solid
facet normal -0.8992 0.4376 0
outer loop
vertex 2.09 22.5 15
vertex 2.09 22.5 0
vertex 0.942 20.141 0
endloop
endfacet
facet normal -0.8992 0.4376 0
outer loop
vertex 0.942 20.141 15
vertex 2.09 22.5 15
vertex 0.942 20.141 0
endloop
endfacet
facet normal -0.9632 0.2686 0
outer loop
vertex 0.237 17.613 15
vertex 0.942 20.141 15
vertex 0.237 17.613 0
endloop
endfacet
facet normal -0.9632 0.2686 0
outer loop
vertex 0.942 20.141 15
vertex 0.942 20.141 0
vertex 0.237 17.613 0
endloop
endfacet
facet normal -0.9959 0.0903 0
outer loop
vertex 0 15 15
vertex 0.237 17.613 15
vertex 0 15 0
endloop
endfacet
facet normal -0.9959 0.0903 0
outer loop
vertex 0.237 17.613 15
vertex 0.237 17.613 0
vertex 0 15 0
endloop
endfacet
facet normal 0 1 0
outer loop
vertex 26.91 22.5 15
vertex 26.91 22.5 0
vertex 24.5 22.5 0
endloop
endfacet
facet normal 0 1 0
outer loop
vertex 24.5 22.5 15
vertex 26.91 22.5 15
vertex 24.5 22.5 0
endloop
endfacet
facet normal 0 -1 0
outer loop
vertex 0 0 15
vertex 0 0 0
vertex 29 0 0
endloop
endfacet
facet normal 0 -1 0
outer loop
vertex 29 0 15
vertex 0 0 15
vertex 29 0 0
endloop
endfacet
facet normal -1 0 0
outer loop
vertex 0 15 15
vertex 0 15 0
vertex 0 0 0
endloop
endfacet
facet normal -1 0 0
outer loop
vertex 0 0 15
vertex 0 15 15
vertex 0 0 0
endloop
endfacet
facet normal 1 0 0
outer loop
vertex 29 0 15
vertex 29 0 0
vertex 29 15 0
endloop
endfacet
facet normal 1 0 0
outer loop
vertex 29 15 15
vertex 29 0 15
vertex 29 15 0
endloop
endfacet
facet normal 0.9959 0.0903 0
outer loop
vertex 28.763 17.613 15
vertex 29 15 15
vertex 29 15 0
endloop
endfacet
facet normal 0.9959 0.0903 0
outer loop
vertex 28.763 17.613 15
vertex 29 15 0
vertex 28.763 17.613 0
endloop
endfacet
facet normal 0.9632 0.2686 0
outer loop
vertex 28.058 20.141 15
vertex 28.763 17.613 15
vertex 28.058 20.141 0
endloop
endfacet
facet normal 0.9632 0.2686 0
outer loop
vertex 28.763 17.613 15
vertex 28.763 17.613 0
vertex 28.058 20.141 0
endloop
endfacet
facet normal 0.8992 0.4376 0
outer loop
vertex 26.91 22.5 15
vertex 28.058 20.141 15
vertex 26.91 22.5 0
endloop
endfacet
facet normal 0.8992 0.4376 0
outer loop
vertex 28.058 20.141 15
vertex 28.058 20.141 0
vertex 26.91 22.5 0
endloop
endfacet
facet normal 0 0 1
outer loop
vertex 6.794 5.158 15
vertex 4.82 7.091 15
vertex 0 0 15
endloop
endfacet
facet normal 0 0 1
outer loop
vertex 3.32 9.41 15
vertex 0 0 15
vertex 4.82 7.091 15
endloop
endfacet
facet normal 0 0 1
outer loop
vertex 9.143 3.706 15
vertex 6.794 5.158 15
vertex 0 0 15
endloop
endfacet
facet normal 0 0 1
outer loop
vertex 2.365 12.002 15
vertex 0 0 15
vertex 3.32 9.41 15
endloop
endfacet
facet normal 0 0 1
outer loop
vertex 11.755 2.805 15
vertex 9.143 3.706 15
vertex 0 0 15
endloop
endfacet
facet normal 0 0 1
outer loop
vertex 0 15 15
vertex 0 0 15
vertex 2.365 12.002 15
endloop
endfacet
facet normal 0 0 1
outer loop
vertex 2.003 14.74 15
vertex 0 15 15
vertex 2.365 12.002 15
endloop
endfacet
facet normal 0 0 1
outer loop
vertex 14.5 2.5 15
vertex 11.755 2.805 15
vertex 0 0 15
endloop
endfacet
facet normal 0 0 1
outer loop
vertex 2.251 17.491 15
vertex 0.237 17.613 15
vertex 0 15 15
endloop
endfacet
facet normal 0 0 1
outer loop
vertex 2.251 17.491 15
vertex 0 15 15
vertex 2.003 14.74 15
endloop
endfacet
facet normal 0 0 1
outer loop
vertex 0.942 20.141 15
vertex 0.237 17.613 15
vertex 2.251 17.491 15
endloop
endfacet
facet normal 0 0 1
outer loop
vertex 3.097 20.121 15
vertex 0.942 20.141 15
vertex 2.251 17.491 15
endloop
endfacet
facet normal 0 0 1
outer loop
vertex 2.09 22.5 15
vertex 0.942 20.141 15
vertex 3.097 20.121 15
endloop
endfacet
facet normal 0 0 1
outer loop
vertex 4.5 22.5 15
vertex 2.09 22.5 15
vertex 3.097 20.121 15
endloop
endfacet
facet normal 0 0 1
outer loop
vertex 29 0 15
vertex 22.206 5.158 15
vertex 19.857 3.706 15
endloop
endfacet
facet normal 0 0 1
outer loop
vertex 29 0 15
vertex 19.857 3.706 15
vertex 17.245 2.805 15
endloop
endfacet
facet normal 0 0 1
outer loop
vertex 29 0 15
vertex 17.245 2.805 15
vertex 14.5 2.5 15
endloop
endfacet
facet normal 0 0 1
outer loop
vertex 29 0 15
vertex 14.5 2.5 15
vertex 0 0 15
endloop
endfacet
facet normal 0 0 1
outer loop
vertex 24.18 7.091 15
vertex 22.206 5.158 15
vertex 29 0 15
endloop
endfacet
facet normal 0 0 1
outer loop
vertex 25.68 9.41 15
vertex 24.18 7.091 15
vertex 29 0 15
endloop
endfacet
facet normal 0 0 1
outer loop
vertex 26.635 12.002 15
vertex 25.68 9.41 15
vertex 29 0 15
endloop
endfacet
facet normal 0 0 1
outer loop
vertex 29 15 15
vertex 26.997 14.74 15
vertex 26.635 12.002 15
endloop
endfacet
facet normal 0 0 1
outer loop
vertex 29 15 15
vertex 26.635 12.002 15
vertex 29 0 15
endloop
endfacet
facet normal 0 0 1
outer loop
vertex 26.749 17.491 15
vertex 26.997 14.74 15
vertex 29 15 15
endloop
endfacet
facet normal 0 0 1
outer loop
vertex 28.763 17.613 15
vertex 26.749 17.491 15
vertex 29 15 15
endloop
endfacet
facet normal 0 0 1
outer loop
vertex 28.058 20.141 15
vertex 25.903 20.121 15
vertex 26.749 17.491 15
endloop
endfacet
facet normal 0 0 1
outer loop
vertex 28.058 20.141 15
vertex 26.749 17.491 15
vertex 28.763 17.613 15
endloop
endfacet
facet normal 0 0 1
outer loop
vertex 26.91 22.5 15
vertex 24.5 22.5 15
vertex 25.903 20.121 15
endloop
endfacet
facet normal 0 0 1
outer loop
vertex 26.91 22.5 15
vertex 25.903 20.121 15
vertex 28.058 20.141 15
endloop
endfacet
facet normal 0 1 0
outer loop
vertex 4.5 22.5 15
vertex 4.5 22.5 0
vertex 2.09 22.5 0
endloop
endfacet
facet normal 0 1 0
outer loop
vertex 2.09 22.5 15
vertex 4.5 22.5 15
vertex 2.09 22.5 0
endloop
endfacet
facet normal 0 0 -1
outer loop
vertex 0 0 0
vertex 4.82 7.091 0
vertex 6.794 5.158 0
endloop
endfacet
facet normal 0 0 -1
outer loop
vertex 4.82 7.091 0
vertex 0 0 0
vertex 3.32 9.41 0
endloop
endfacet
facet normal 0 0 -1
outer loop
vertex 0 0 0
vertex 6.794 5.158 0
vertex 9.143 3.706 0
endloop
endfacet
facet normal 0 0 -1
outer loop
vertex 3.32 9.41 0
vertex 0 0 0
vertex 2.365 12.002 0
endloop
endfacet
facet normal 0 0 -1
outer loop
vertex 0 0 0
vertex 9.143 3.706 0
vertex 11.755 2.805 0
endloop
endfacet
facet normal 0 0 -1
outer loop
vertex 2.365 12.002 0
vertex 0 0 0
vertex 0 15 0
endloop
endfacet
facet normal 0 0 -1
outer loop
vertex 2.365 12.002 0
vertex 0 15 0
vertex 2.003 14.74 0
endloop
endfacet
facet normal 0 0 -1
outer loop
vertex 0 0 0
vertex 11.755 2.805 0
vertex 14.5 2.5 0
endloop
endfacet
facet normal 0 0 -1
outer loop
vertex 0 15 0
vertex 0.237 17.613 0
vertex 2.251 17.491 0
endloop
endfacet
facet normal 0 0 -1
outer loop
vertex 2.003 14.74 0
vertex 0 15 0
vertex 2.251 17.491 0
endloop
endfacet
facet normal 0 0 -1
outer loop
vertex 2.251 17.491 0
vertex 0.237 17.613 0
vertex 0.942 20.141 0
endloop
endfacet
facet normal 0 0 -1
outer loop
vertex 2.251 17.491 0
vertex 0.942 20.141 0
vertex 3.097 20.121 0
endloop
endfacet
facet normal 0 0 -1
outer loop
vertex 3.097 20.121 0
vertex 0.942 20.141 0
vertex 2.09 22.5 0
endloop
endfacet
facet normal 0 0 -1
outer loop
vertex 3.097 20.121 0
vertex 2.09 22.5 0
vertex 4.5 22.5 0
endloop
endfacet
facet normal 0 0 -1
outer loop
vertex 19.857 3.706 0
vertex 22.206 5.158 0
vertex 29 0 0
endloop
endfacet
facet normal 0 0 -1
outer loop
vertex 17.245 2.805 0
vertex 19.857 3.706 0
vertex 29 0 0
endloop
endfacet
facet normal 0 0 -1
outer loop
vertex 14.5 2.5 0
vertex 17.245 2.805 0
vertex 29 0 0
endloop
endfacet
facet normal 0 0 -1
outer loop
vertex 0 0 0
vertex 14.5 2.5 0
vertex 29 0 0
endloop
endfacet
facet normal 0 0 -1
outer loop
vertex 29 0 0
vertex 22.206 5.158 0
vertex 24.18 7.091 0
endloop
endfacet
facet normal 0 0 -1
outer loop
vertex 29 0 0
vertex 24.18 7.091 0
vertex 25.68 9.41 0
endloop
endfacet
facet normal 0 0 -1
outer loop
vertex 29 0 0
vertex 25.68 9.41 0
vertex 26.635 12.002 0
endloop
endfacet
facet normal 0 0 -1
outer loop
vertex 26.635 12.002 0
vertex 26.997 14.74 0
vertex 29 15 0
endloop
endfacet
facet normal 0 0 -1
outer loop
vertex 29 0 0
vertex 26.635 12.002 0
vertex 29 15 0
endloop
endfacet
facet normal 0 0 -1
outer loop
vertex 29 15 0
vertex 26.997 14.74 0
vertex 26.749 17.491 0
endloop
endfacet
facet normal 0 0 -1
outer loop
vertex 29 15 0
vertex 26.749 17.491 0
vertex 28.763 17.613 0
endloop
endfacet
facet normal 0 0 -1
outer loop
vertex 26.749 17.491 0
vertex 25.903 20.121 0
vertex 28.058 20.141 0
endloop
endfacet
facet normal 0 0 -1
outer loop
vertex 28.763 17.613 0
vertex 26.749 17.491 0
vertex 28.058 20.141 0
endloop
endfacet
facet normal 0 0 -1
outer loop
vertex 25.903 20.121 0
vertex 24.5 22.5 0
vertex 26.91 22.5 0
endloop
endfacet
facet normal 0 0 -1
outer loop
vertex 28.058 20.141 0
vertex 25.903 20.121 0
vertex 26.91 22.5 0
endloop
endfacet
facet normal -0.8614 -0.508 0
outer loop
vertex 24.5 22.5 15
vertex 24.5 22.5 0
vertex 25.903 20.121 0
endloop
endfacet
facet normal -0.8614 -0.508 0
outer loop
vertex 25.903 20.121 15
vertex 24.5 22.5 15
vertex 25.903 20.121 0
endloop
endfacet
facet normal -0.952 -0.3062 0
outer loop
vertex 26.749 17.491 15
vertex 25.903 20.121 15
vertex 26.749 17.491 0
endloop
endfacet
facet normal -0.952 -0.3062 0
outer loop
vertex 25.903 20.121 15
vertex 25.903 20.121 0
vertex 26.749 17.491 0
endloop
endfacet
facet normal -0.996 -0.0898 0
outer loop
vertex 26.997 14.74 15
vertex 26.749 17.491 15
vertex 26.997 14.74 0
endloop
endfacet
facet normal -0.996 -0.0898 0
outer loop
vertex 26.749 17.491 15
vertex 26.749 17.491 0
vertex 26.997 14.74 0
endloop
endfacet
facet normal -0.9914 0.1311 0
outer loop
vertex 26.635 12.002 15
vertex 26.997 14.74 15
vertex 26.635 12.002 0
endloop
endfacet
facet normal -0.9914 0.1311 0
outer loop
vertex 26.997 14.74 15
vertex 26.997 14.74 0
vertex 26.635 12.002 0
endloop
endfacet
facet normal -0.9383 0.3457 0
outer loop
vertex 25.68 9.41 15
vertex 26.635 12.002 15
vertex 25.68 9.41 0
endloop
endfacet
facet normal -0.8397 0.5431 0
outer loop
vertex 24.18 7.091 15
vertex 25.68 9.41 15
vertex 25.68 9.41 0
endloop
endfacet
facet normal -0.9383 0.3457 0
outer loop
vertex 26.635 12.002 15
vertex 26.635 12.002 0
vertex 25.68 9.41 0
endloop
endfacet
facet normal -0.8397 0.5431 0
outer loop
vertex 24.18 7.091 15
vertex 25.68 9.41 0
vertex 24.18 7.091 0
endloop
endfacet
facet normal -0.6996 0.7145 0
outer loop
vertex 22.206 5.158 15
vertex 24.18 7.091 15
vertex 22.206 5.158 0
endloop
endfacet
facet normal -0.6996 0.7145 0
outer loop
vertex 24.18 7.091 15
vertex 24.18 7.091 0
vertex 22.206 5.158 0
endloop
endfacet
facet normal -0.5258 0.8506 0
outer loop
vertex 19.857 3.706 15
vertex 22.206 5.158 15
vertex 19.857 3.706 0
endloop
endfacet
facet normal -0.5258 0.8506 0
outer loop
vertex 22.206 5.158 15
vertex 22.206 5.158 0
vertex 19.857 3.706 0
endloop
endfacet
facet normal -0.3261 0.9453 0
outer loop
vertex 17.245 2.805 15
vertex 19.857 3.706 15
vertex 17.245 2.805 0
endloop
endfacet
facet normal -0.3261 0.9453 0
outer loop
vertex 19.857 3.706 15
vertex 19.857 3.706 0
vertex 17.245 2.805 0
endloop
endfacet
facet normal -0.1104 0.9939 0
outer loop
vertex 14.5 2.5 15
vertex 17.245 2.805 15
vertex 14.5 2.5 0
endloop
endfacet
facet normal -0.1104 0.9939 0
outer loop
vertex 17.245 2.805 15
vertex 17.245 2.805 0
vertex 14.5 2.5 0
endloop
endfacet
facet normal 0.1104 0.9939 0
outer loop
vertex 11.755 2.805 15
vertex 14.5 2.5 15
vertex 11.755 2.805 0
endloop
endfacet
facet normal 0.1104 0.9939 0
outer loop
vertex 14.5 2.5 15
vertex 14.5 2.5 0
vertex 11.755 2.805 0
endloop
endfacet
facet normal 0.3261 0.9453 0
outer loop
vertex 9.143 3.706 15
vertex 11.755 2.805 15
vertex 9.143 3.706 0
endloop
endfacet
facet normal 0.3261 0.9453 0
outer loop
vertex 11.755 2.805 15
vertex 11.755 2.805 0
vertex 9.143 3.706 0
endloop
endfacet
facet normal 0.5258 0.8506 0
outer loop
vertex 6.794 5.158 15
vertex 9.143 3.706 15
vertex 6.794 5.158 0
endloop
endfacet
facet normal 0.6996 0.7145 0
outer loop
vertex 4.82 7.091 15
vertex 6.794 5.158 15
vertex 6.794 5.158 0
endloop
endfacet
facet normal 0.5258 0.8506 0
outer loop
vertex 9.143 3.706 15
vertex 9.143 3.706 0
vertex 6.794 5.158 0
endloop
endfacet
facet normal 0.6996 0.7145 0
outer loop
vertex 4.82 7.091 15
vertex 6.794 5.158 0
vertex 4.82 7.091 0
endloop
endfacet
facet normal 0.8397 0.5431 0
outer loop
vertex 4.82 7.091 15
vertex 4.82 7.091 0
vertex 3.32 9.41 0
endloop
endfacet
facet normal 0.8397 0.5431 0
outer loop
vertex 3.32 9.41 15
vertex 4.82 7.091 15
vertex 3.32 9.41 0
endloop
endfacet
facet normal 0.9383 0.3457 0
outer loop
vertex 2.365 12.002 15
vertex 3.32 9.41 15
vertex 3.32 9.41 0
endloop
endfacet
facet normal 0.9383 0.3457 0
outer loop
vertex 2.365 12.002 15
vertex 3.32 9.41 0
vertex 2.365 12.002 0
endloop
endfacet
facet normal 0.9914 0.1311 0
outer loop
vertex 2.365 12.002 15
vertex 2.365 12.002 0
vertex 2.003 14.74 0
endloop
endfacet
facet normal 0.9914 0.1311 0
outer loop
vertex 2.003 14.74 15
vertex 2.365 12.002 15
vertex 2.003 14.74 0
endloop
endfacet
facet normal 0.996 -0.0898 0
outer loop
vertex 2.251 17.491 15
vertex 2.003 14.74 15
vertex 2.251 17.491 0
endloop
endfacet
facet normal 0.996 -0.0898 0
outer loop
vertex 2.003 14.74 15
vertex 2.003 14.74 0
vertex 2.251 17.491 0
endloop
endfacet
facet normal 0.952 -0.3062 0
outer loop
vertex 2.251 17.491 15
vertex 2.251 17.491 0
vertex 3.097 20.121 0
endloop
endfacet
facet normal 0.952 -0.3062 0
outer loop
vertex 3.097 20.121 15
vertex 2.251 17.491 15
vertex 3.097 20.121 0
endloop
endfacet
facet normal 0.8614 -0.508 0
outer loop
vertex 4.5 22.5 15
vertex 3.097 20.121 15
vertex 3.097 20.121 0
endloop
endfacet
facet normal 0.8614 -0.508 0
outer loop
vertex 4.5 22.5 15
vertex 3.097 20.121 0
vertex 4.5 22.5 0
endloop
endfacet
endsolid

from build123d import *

# Parameters (mm, degrees)
F1_DEPTH = 15


with BuildPart() as f1:
    # F0 (on Top) → F1 (new body)
    with BuildSketch(Plane.XY):
        with BuildLine():
            ThreePointArc((24.5, 22.5), (14.5, 2.5), (4.5, 22.5))
            Line((4.5, 22.5), (2.090326, 22.5))
            ThreePointArc((2.090326, 22.5), (0.532354, 18.892925), (0, 15))
            Line((0, 15), (0, 0))
            Line((0, 0), (29, 0))
            Line((29, 0), (29, 15))
            ThreePointArc((29, 15), (28.467646, 18.892925), (26.909674, 22.5))
            Line((26.909674, 22.5), (24.5, 22.5))
        make_face()
    extrude(amount=F1_DEPTH)


solid = f1.part
